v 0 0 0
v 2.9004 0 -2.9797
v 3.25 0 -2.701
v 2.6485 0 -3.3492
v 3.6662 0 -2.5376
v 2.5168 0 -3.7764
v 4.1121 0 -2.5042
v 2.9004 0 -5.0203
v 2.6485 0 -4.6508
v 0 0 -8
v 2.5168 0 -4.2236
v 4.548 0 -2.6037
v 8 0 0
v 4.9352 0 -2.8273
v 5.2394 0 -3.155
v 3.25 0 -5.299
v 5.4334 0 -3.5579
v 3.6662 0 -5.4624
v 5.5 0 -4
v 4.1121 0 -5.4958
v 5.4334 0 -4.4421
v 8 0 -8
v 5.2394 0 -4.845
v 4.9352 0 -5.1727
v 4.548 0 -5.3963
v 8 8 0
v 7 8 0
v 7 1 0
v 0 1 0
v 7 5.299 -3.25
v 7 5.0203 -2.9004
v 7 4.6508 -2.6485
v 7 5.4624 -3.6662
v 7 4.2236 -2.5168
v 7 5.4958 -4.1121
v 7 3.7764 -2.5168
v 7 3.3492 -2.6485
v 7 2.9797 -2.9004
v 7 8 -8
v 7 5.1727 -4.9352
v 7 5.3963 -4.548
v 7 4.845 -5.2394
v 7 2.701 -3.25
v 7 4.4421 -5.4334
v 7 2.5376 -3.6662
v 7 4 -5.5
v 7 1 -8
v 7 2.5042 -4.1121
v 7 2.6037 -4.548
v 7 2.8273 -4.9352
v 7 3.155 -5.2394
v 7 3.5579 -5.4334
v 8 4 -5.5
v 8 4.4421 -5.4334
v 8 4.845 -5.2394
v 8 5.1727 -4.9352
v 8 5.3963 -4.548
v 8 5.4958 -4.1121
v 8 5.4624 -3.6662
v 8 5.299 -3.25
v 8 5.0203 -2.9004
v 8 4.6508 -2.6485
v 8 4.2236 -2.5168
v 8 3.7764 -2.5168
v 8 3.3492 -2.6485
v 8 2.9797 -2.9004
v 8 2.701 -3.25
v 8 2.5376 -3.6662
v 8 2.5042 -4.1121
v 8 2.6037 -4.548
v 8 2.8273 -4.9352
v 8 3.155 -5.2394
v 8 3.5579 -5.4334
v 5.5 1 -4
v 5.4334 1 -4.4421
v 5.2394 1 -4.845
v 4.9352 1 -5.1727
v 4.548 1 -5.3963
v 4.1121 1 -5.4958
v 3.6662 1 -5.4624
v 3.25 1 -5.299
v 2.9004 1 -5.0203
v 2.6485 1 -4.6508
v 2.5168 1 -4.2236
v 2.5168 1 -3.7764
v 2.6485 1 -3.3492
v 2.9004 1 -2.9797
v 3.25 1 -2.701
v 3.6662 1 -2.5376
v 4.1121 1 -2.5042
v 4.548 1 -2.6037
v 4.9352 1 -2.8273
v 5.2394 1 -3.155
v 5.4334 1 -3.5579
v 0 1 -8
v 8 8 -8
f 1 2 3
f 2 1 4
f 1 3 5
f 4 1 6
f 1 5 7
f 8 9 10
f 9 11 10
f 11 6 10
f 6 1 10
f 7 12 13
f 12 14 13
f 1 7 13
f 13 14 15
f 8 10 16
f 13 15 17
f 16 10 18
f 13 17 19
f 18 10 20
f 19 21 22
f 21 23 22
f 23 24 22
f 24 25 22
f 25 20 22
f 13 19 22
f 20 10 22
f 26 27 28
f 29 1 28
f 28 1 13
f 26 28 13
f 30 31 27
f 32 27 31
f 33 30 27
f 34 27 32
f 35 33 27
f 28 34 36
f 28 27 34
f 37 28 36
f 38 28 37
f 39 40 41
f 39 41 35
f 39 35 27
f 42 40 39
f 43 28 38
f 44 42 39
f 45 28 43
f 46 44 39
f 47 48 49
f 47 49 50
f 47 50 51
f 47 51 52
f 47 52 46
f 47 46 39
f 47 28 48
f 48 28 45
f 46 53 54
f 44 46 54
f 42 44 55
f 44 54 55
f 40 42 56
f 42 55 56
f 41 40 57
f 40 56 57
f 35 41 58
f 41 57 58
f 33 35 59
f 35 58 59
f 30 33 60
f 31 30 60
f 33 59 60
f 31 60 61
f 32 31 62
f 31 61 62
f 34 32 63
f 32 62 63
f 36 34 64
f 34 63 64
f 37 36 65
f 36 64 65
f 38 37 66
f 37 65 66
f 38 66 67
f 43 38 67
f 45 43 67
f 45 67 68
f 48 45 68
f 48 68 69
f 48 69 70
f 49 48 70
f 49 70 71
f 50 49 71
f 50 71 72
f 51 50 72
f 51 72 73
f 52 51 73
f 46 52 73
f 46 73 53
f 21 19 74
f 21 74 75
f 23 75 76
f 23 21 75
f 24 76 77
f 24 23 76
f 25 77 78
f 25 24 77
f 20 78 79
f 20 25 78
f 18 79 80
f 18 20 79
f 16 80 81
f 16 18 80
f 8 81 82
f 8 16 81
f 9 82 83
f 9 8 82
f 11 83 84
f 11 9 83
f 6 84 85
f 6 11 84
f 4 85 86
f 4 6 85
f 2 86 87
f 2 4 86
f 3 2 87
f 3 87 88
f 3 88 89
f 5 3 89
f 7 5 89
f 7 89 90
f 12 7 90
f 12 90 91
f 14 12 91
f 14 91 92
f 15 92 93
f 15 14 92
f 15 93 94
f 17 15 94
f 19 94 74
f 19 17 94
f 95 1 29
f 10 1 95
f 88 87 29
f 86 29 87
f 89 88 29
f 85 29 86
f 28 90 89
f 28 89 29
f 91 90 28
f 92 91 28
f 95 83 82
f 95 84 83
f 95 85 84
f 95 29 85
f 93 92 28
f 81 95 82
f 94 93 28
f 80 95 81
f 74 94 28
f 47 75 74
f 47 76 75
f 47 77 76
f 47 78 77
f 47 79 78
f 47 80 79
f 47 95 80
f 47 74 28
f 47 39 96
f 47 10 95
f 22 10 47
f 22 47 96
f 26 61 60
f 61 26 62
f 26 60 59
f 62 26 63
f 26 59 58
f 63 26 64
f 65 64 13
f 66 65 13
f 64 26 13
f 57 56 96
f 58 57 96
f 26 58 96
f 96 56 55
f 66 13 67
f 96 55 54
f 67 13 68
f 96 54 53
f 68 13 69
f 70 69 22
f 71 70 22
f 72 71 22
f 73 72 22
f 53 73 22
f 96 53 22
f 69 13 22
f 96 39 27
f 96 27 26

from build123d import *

# Parameters (mm, degrees)
ESQUISSE1_W      = 8
ESQUISSE1_H      = 8
ESQUISSE1_R      = 1.5
EXTRUSION1_DEPTH = 1
ESQUISSE2_W      = 1
ESQUISSE2_H      = 8
EXTRUSION2_DEPTH = 7
EXTRUSION3_REACH = 10
ESQUISSE3_R      = 1.5


with BuildPart() as part:
    # Esquisse1 → Extrusion1 (new body)
    with BuildSketch(Plane(origin=(0, 0, 0), x_dir=(1, 0, 0), z_dir=(0, 1, 0))):
        with Locations((4, 4)):
            Rectangle(ESQUISSE1_W, ESQUISSE1_H)
        with Locations((4, 4)):
            Circle(ESQUISSE1_R, mode=Mode.SUBTRACT)
    extrude(amount=EXTRUSION1_DEPTH)

    # Esquisse2 → Extrusion2 (add)
    with BuildSketch(Plane(origin=(0, 1, 0), x_dir=(1, 0, 0), z_dir=(0, 1, 0))):
        with Locations((7.5, 4)):
            Rectangle(ESQUISSE2_W, ESQUISSE2_H)
    extrude(amount=EXTRUSION2_DEPTH)

    # Esquisse3 → Extrusion3 (cut, up to next)
    with BuildSketch(Plane(origin=(8, 0, 0), x_dir=(0, 0, -1), z_dir=(1, 0, 0)), mode=Mode.PRIVATE) as extrusion3_sk1:
        with Locations((4, 4)):
            Circle(ESQUISSE3_R)
    extrusion3_tool1 = extrude(extrusion3_sk1.sketch, amount=-EXTRUSION3_REACH, mode=Mode.PRIVATE) & part.part
    add(extrusion3_tool1.solids().sort_by_distance((8, 4, -4))[0], mode=Mode.SUBTRACT)


solid = part.part
